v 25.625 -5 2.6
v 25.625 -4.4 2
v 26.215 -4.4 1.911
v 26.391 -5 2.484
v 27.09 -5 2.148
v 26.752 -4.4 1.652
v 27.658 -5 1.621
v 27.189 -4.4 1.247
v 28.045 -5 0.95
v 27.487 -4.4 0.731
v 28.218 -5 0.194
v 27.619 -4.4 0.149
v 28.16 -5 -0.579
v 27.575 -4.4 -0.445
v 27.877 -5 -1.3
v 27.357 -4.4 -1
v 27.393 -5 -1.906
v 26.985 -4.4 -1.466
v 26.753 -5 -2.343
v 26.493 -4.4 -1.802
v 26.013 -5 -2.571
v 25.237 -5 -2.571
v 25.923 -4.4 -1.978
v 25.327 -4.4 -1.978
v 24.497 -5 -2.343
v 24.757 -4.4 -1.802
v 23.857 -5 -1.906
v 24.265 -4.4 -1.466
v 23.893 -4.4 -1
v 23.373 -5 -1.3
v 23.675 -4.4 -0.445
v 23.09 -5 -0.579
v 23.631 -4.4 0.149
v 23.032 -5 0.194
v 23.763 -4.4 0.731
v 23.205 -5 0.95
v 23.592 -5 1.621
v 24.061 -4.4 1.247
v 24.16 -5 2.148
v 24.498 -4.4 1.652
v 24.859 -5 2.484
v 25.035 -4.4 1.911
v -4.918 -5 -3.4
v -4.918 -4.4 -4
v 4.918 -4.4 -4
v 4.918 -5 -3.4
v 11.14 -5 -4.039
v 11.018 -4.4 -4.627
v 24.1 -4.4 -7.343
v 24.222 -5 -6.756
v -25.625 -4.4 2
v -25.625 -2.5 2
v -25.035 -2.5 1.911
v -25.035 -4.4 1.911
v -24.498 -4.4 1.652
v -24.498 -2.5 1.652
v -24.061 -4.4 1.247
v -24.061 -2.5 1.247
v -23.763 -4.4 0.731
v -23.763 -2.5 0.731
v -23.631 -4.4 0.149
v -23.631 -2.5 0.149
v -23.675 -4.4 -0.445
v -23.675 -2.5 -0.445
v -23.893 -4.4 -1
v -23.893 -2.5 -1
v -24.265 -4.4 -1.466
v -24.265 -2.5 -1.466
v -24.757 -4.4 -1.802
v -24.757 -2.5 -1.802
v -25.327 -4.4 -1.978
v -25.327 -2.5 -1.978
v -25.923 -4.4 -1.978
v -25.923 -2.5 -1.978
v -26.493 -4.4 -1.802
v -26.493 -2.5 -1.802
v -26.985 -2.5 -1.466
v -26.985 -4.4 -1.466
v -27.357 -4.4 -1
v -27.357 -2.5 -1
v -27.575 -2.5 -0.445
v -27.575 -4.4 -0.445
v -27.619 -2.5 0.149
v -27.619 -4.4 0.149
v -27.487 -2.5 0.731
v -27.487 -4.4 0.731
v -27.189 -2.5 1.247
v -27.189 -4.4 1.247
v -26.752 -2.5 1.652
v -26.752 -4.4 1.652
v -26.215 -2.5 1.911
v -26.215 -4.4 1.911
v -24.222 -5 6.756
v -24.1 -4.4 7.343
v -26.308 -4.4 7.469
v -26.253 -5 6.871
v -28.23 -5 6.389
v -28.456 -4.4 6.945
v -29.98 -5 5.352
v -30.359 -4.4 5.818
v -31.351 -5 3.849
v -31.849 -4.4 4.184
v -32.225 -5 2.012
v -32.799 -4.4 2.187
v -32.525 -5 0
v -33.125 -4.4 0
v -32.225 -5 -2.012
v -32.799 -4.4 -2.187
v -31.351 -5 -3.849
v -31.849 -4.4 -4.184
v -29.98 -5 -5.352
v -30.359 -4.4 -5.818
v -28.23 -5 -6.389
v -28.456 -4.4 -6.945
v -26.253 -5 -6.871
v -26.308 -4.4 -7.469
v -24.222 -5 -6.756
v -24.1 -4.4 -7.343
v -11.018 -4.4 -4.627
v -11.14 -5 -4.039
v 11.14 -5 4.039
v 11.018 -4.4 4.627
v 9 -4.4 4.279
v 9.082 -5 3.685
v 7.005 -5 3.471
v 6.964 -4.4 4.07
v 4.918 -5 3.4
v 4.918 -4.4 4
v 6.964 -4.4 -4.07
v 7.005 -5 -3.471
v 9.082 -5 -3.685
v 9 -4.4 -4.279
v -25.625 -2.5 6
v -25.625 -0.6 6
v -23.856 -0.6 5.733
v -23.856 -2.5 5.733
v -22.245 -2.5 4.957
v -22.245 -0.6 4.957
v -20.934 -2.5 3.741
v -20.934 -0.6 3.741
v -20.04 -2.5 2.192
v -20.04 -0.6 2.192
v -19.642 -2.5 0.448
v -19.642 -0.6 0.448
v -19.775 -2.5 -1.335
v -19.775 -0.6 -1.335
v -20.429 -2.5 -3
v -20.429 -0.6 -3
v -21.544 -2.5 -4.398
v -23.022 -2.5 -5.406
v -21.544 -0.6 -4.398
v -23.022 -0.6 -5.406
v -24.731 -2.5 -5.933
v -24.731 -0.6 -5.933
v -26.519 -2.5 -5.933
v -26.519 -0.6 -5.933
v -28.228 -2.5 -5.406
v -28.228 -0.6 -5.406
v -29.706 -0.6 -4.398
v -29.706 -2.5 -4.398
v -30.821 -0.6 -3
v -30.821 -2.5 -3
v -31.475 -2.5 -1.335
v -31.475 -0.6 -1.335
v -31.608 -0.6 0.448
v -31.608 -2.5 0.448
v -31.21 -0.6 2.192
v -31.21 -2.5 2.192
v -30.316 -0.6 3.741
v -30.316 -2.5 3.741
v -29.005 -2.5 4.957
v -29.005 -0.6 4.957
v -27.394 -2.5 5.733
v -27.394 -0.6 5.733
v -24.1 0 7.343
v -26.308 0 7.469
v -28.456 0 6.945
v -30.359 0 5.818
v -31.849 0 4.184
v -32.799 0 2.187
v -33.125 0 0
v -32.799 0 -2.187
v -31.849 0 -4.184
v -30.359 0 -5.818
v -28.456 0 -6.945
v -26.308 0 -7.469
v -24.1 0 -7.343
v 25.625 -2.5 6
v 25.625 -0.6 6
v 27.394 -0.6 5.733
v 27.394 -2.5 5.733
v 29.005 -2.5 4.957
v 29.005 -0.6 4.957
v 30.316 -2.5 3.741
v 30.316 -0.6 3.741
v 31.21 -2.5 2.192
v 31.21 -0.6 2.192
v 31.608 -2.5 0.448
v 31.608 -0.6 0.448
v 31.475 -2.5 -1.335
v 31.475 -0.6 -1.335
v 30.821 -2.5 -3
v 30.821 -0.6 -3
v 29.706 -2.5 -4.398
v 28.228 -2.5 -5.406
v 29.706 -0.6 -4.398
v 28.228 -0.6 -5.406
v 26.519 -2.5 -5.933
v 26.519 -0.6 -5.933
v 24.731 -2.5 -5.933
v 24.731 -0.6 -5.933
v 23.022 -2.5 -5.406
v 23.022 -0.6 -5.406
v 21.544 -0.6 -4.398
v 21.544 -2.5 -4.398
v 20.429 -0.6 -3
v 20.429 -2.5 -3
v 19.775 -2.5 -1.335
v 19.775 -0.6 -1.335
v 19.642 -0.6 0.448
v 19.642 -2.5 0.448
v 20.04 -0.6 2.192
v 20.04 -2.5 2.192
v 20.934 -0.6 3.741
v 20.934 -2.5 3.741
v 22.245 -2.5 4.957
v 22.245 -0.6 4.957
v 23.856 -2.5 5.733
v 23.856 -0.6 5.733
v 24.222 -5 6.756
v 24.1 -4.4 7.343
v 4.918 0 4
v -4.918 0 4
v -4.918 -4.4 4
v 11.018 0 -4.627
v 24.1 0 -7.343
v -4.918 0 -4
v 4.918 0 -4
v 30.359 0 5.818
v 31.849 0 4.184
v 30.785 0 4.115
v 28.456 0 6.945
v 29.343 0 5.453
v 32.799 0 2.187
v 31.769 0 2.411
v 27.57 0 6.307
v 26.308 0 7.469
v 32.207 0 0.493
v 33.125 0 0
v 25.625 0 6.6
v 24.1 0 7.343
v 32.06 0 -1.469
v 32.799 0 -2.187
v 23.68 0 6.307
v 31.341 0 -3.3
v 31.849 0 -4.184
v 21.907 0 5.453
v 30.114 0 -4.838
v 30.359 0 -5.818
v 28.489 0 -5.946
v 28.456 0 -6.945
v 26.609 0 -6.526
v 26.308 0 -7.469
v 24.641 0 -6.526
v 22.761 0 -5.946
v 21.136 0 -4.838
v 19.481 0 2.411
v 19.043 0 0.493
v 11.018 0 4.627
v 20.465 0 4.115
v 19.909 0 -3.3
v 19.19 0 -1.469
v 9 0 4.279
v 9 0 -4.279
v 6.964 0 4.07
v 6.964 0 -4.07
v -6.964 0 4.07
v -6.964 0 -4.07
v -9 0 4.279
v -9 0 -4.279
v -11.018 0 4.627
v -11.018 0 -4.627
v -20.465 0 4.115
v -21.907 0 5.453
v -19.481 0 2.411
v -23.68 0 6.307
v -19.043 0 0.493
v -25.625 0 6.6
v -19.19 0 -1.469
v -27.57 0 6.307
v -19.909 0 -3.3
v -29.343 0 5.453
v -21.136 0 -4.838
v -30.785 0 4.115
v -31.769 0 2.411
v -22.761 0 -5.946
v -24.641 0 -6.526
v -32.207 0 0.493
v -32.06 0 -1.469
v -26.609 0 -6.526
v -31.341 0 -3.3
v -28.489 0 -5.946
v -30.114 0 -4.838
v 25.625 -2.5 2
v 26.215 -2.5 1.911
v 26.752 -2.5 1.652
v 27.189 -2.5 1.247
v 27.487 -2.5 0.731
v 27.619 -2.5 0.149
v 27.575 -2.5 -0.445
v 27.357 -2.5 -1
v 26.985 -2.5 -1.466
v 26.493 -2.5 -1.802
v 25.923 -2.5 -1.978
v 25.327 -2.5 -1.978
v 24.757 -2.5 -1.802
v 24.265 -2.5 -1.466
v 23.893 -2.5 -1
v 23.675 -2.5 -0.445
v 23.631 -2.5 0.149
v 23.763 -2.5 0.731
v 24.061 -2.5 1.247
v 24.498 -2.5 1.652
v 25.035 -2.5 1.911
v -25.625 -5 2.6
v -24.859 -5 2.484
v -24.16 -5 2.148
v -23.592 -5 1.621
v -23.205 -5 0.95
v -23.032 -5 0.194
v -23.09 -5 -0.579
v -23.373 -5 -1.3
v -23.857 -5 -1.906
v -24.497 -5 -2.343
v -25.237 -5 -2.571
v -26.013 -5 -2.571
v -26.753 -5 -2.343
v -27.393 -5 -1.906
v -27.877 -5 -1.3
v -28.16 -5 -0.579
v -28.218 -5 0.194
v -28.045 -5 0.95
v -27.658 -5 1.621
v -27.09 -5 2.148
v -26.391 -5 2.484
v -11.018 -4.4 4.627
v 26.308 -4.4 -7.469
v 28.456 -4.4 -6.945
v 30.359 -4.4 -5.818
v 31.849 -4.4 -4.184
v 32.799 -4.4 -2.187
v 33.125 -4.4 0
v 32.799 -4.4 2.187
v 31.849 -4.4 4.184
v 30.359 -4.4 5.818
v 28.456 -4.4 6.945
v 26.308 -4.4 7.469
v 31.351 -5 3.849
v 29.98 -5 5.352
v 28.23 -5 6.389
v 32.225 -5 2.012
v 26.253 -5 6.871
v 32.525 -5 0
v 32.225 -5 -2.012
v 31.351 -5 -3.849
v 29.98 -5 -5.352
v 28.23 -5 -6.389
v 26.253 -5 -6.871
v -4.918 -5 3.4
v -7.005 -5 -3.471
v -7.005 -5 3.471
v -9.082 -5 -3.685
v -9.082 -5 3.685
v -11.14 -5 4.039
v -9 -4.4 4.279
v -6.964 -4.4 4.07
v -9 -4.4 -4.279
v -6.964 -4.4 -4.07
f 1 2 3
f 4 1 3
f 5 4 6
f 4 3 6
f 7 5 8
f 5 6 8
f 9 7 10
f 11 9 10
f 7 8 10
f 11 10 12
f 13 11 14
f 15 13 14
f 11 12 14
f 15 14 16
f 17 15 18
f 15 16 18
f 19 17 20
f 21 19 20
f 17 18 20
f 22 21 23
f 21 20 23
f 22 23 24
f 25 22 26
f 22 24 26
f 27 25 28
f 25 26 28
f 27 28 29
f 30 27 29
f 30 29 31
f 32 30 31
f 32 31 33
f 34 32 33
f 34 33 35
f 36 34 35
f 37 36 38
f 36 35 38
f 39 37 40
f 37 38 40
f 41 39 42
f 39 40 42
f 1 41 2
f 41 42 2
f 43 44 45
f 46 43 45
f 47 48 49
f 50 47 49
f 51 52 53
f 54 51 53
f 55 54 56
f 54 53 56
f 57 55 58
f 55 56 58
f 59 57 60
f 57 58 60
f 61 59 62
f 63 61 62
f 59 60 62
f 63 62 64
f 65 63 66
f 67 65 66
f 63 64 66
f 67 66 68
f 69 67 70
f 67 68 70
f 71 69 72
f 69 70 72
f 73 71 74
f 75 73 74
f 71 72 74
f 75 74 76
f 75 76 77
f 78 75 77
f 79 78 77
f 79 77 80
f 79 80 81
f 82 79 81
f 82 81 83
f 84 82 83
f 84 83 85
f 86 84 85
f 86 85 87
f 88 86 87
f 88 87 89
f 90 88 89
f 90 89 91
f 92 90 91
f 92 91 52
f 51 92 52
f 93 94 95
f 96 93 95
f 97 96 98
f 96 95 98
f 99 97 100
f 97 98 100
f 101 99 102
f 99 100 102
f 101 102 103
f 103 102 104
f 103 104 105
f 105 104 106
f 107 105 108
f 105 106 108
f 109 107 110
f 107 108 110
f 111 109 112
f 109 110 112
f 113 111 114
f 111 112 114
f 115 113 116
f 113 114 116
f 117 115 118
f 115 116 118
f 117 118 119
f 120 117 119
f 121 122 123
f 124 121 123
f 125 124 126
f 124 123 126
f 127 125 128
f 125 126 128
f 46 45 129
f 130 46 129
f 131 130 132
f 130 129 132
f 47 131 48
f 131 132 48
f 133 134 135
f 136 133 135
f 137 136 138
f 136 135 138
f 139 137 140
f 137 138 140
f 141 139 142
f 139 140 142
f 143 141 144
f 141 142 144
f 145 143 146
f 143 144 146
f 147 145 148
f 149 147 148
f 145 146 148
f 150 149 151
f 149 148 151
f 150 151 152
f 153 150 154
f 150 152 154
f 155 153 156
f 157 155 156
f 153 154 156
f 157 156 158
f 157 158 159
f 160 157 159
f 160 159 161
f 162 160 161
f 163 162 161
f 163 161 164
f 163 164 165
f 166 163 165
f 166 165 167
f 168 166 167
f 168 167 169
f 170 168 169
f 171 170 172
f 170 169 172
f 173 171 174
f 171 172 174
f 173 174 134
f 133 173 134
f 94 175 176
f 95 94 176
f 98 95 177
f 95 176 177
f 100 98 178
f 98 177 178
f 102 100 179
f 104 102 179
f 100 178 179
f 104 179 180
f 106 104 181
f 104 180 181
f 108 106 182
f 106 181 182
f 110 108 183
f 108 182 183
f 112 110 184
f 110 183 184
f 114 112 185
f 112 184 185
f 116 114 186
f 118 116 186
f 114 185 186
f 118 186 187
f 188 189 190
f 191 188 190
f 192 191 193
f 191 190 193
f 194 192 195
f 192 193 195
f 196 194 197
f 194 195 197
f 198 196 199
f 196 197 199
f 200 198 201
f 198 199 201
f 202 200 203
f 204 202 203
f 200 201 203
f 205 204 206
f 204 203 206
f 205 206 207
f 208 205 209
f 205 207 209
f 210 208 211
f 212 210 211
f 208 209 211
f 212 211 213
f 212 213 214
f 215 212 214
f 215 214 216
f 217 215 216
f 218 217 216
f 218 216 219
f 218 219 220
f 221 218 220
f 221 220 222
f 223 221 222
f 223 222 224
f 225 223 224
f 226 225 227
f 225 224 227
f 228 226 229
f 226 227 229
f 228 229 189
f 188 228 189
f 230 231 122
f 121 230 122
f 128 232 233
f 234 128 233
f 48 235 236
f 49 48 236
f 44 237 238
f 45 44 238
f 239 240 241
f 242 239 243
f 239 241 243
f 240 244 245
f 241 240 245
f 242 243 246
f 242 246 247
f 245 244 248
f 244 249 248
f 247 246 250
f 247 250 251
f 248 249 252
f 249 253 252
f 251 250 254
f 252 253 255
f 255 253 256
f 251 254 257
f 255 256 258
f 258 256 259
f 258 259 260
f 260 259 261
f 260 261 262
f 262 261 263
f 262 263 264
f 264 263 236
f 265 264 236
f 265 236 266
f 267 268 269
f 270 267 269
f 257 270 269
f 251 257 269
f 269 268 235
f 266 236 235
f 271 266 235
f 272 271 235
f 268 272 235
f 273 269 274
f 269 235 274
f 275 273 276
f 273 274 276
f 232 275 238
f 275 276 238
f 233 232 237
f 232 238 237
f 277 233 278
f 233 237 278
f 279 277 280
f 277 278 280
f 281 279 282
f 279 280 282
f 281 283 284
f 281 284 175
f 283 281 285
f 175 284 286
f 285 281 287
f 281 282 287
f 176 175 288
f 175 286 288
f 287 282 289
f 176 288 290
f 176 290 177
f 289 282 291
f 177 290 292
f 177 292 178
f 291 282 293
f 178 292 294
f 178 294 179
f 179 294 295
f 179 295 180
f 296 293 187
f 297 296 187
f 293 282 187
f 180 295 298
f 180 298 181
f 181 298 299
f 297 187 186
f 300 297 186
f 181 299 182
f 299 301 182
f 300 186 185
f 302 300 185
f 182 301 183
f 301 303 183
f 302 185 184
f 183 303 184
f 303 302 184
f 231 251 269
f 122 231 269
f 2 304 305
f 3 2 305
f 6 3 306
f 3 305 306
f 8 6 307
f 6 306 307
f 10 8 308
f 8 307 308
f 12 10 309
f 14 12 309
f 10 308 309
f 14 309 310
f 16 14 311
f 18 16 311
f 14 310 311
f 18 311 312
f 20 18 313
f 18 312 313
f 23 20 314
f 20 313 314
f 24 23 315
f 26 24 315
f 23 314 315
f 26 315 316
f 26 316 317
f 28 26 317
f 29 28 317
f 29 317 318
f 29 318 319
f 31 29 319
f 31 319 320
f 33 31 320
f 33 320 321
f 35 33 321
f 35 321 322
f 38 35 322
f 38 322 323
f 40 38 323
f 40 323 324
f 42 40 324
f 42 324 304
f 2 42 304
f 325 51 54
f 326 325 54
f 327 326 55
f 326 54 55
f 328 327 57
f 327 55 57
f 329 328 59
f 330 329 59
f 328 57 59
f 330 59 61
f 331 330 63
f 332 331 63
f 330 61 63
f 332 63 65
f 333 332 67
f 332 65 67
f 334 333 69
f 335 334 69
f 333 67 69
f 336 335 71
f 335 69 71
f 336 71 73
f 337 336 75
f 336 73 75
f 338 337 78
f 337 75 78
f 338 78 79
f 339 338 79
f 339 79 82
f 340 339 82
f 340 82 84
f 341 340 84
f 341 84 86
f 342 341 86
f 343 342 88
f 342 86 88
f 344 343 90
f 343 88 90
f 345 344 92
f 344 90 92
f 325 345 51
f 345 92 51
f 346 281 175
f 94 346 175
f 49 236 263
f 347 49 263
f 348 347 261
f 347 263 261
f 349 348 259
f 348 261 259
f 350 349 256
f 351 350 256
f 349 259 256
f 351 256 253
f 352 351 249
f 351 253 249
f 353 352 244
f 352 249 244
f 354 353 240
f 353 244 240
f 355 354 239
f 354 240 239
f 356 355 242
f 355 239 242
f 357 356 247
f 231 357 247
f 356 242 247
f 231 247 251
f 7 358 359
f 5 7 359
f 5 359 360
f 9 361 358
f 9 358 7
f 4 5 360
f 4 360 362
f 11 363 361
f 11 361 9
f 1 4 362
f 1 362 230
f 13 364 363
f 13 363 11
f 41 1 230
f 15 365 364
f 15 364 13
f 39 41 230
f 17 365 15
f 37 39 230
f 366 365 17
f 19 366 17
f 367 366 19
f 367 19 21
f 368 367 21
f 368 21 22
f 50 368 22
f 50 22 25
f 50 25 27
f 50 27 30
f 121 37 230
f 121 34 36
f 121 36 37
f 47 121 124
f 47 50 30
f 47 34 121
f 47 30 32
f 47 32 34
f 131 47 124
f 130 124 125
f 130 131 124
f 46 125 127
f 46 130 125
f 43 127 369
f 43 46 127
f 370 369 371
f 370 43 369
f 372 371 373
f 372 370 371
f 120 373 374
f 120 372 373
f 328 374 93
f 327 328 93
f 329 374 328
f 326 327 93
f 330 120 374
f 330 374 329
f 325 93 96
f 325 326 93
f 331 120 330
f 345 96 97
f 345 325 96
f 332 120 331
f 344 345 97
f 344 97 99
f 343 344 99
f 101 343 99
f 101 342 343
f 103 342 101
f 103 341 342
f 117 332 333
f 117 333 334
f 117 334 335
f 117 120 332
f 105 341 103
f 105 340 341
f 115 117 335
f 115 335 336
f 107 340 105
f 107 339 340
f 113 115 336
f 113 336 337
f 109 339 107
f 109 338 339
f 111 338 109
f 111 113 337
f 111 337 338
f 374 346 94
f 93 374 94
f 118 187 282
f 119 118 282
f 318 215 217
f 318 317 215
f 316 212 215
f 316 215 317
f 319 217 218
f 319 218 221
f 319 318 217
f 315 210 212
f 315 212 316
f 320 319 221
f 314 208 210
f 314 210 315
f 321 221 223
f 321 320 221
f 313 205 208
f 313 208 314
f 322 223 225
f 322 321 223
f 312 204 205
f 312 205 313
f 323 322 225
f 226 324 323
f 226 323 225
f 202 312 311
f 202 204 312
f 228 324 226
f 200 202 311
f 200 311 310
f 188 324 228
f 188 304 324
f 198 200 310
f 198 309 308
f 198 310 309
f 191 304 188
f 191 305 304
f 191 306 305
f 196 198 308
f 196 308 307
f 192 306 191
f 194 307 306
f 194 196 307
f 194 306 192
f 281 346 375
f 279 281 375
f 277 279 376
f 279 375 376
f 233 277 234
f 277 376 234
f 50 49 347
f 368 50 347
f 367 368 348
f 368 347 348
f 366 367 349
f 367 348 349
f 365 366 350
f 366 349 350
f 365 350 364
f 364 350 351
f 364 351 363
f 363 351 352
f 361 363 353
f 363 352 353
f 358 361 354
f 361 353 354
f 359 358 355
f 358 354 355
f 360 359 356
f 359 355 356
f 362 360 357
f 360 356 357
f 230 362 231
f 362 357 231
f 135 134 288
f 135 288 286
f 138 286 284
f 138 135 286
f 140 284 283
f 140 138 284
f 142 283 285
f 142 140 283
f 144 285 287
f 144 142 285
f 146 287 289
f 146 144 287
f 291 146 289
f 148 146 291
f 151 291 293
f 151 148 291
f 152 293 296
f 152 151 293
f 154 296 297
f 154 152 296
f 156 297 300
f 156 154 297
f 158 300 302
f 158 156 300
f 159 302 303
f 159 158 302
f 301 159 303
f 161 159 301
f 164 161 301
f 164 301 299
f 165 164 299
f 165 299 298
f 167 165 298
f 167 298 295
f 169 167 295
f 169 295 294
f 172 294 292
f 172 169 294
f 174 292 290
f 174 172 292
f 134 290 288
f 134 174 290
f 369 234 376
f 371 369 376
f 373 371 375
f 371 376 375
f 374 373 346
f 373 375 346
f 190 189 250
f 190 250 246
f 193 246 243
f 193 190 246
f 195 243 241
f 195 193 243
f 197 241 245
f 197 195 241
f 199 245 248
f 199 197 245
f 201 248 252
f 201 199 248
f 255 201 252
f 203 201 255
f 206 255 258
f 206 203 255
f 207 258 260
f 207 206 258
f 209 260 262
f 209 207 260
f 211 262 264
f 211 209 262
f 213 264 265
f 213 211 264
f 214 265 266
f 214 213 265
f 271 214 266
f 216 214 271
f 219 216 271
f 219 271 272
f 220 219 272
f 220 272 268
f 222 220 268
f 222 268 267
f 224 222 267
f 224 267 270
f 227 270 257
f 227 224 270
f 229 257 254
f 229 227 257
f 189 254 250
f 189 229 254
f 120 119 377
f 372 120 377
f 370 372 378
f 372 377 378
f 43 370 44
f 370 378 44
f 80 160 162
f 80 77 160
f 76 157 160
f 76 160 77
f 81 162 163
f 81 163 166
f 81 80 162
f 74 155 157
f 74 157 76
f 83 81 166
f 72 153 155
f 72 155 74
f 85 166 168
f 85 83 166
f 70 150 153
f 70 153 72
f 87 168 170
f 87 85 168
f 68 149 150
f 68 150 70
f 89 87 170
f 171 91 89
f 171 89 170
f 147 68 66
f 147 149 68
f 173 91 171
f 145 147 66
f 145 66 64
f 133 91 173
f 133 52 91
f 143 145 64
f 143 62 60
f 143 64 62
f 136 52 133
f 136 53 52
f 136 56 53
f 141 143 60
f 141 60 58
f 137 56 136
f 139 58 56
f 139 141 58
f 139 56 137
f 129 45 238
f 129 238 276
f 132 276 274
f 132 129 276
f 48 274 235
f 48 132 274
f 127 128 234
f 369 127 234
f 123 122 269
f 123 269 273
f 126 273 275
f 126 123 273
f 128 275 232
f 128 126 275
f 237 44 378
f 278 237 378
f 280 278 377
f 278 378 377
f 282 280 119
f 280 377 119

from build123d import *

# Parameters (mm, degrees)
SKETCH1_R           = 2
BOSS_EXTRUDE1_DEPTH = 5
SKETCH1_3_R         = 6
SKETCH1_3_R_2       = 2
CUT_EXTRUDE1_DEPTH  = 2.5
FILLET1_R           = 30
CHAMFER1_SIZE       = 0.6
CHAMFER2_SIZE       = 0.6


with BuildPart() as part:
    # Sketch1 → Boss-Extrude1 (new body)
    with BuildSketch(Plane(origin=(0, 0, 0), x_dir=(1, 0, 0), z_dir=(0, 1, 0))):
        with BuildLine():
            Line((8, 4), (-8, 4))
            Line((-8, 4), (-24.100084087, 7.343339258))
            ThreePointArc((-24.100084087, 7.343339258), (-33.125, 0), (-24.100084087, -7.343339258))
            Line((-24.100084087, -7.343339258), (-8, -4))
            Line((-8, -4), (8, -4))
            Line((8, -4), (24.100084087, -7.343339258))
            ThreePointArc((24.100084087, -7.343339258), (33.125, 0), (24.100084087, 7.343339258))
            Line((24.100084087, 7.343339258), (8, 4))
        make_face()
        with Locations((-25.625, 0)):
            Circle(SKETCH1_R, mode=Mode.SUBTRACT)
        with Locations((25.625, 0)):
            Circle(SKETCH1_R, mode=Mode.SUBTRACT)
    extrude(amount=-BOSS_EXTRUDE1_DEPTH)

    # Sketch1<3> → Cut-Extrude1 (cut)
    # profile 1 of 2: a face of its own
    with BuildSketch(Plane(origin=(0, 0, 0), x_dir=(1, 0, 0), z_dir=(0, 1, 0))):
        with Locations((-25.625, 0)):
            Circle(SKETCH1_3_R)
        with Locations((-25.625, 0)):
            Circle(SKETCH1_3_R_2, mode=Mode.SUBTRACT)
    # profile 2 of 2: a face of its own
    with BuildSketch(Plane(origin=(0, 0, 0), x_dir=(1, 0, 0), z_dir=(0, 1, 0))):
        with Locations((25.625, 0)):
            Circle(SKETCH1_3_R)
        with Locations((25.625, 0)):
            Circle(SKETCH1_3_R_2, mode=Mode.SUBTRACT)
    extrude(amount=-CUT_EXTRUDE1_DEPTH, mode=Mode.SUBTRACT)

    # Fillet1
    fillet1_edges = [part.edges().sort_by_distance(p)[0] for p in [
        (8, -2.5, -4),
        (-8, -2.5, -4),
        (8, -2.5, 4),
        (-8, -2.5, 4),
    ]]
    fillet(fillet1_edges, radius=FILLET1_R)

    # Chamfer1
    chamfer1_edges = [part.edges().sort_by_distance(p)[0] for p in [
        (-33.125, -5, 0),
        (-17.558863569, -5, 5.984991113),
        (0, -5, 4),
        (17.558863569, -5, 5.984991113),
        (33.125, -5, 0),
        (17.558863569, -5, -5.984991113),
        (0, -5, -4),
        (-17.558863569, -5, -5.984991113),
        (-27.625, -5, 0),
        (23.625, -5, 0),
        (-7.983863369, -5, 4.157071935),
        (7.983863369, -5, 4.157071935),
        (7.983863369, -5, -4.157071935),
        (-7.983863369, -5, -4.157071935),
    ]]
    chamfer(chamfer1_edges, length=CHAMFER1_SIZE)

    # Chamfer2
    chamfer2_edges = [part.edges().sort_by_distance(p)[0] for p in [
        (19.625, 0, 0),
        (-31.625, 0, 0),
    ]]
    chamfer(chamfer2_edges, length=CHAMFER2_SIZE)


solid = part.part
